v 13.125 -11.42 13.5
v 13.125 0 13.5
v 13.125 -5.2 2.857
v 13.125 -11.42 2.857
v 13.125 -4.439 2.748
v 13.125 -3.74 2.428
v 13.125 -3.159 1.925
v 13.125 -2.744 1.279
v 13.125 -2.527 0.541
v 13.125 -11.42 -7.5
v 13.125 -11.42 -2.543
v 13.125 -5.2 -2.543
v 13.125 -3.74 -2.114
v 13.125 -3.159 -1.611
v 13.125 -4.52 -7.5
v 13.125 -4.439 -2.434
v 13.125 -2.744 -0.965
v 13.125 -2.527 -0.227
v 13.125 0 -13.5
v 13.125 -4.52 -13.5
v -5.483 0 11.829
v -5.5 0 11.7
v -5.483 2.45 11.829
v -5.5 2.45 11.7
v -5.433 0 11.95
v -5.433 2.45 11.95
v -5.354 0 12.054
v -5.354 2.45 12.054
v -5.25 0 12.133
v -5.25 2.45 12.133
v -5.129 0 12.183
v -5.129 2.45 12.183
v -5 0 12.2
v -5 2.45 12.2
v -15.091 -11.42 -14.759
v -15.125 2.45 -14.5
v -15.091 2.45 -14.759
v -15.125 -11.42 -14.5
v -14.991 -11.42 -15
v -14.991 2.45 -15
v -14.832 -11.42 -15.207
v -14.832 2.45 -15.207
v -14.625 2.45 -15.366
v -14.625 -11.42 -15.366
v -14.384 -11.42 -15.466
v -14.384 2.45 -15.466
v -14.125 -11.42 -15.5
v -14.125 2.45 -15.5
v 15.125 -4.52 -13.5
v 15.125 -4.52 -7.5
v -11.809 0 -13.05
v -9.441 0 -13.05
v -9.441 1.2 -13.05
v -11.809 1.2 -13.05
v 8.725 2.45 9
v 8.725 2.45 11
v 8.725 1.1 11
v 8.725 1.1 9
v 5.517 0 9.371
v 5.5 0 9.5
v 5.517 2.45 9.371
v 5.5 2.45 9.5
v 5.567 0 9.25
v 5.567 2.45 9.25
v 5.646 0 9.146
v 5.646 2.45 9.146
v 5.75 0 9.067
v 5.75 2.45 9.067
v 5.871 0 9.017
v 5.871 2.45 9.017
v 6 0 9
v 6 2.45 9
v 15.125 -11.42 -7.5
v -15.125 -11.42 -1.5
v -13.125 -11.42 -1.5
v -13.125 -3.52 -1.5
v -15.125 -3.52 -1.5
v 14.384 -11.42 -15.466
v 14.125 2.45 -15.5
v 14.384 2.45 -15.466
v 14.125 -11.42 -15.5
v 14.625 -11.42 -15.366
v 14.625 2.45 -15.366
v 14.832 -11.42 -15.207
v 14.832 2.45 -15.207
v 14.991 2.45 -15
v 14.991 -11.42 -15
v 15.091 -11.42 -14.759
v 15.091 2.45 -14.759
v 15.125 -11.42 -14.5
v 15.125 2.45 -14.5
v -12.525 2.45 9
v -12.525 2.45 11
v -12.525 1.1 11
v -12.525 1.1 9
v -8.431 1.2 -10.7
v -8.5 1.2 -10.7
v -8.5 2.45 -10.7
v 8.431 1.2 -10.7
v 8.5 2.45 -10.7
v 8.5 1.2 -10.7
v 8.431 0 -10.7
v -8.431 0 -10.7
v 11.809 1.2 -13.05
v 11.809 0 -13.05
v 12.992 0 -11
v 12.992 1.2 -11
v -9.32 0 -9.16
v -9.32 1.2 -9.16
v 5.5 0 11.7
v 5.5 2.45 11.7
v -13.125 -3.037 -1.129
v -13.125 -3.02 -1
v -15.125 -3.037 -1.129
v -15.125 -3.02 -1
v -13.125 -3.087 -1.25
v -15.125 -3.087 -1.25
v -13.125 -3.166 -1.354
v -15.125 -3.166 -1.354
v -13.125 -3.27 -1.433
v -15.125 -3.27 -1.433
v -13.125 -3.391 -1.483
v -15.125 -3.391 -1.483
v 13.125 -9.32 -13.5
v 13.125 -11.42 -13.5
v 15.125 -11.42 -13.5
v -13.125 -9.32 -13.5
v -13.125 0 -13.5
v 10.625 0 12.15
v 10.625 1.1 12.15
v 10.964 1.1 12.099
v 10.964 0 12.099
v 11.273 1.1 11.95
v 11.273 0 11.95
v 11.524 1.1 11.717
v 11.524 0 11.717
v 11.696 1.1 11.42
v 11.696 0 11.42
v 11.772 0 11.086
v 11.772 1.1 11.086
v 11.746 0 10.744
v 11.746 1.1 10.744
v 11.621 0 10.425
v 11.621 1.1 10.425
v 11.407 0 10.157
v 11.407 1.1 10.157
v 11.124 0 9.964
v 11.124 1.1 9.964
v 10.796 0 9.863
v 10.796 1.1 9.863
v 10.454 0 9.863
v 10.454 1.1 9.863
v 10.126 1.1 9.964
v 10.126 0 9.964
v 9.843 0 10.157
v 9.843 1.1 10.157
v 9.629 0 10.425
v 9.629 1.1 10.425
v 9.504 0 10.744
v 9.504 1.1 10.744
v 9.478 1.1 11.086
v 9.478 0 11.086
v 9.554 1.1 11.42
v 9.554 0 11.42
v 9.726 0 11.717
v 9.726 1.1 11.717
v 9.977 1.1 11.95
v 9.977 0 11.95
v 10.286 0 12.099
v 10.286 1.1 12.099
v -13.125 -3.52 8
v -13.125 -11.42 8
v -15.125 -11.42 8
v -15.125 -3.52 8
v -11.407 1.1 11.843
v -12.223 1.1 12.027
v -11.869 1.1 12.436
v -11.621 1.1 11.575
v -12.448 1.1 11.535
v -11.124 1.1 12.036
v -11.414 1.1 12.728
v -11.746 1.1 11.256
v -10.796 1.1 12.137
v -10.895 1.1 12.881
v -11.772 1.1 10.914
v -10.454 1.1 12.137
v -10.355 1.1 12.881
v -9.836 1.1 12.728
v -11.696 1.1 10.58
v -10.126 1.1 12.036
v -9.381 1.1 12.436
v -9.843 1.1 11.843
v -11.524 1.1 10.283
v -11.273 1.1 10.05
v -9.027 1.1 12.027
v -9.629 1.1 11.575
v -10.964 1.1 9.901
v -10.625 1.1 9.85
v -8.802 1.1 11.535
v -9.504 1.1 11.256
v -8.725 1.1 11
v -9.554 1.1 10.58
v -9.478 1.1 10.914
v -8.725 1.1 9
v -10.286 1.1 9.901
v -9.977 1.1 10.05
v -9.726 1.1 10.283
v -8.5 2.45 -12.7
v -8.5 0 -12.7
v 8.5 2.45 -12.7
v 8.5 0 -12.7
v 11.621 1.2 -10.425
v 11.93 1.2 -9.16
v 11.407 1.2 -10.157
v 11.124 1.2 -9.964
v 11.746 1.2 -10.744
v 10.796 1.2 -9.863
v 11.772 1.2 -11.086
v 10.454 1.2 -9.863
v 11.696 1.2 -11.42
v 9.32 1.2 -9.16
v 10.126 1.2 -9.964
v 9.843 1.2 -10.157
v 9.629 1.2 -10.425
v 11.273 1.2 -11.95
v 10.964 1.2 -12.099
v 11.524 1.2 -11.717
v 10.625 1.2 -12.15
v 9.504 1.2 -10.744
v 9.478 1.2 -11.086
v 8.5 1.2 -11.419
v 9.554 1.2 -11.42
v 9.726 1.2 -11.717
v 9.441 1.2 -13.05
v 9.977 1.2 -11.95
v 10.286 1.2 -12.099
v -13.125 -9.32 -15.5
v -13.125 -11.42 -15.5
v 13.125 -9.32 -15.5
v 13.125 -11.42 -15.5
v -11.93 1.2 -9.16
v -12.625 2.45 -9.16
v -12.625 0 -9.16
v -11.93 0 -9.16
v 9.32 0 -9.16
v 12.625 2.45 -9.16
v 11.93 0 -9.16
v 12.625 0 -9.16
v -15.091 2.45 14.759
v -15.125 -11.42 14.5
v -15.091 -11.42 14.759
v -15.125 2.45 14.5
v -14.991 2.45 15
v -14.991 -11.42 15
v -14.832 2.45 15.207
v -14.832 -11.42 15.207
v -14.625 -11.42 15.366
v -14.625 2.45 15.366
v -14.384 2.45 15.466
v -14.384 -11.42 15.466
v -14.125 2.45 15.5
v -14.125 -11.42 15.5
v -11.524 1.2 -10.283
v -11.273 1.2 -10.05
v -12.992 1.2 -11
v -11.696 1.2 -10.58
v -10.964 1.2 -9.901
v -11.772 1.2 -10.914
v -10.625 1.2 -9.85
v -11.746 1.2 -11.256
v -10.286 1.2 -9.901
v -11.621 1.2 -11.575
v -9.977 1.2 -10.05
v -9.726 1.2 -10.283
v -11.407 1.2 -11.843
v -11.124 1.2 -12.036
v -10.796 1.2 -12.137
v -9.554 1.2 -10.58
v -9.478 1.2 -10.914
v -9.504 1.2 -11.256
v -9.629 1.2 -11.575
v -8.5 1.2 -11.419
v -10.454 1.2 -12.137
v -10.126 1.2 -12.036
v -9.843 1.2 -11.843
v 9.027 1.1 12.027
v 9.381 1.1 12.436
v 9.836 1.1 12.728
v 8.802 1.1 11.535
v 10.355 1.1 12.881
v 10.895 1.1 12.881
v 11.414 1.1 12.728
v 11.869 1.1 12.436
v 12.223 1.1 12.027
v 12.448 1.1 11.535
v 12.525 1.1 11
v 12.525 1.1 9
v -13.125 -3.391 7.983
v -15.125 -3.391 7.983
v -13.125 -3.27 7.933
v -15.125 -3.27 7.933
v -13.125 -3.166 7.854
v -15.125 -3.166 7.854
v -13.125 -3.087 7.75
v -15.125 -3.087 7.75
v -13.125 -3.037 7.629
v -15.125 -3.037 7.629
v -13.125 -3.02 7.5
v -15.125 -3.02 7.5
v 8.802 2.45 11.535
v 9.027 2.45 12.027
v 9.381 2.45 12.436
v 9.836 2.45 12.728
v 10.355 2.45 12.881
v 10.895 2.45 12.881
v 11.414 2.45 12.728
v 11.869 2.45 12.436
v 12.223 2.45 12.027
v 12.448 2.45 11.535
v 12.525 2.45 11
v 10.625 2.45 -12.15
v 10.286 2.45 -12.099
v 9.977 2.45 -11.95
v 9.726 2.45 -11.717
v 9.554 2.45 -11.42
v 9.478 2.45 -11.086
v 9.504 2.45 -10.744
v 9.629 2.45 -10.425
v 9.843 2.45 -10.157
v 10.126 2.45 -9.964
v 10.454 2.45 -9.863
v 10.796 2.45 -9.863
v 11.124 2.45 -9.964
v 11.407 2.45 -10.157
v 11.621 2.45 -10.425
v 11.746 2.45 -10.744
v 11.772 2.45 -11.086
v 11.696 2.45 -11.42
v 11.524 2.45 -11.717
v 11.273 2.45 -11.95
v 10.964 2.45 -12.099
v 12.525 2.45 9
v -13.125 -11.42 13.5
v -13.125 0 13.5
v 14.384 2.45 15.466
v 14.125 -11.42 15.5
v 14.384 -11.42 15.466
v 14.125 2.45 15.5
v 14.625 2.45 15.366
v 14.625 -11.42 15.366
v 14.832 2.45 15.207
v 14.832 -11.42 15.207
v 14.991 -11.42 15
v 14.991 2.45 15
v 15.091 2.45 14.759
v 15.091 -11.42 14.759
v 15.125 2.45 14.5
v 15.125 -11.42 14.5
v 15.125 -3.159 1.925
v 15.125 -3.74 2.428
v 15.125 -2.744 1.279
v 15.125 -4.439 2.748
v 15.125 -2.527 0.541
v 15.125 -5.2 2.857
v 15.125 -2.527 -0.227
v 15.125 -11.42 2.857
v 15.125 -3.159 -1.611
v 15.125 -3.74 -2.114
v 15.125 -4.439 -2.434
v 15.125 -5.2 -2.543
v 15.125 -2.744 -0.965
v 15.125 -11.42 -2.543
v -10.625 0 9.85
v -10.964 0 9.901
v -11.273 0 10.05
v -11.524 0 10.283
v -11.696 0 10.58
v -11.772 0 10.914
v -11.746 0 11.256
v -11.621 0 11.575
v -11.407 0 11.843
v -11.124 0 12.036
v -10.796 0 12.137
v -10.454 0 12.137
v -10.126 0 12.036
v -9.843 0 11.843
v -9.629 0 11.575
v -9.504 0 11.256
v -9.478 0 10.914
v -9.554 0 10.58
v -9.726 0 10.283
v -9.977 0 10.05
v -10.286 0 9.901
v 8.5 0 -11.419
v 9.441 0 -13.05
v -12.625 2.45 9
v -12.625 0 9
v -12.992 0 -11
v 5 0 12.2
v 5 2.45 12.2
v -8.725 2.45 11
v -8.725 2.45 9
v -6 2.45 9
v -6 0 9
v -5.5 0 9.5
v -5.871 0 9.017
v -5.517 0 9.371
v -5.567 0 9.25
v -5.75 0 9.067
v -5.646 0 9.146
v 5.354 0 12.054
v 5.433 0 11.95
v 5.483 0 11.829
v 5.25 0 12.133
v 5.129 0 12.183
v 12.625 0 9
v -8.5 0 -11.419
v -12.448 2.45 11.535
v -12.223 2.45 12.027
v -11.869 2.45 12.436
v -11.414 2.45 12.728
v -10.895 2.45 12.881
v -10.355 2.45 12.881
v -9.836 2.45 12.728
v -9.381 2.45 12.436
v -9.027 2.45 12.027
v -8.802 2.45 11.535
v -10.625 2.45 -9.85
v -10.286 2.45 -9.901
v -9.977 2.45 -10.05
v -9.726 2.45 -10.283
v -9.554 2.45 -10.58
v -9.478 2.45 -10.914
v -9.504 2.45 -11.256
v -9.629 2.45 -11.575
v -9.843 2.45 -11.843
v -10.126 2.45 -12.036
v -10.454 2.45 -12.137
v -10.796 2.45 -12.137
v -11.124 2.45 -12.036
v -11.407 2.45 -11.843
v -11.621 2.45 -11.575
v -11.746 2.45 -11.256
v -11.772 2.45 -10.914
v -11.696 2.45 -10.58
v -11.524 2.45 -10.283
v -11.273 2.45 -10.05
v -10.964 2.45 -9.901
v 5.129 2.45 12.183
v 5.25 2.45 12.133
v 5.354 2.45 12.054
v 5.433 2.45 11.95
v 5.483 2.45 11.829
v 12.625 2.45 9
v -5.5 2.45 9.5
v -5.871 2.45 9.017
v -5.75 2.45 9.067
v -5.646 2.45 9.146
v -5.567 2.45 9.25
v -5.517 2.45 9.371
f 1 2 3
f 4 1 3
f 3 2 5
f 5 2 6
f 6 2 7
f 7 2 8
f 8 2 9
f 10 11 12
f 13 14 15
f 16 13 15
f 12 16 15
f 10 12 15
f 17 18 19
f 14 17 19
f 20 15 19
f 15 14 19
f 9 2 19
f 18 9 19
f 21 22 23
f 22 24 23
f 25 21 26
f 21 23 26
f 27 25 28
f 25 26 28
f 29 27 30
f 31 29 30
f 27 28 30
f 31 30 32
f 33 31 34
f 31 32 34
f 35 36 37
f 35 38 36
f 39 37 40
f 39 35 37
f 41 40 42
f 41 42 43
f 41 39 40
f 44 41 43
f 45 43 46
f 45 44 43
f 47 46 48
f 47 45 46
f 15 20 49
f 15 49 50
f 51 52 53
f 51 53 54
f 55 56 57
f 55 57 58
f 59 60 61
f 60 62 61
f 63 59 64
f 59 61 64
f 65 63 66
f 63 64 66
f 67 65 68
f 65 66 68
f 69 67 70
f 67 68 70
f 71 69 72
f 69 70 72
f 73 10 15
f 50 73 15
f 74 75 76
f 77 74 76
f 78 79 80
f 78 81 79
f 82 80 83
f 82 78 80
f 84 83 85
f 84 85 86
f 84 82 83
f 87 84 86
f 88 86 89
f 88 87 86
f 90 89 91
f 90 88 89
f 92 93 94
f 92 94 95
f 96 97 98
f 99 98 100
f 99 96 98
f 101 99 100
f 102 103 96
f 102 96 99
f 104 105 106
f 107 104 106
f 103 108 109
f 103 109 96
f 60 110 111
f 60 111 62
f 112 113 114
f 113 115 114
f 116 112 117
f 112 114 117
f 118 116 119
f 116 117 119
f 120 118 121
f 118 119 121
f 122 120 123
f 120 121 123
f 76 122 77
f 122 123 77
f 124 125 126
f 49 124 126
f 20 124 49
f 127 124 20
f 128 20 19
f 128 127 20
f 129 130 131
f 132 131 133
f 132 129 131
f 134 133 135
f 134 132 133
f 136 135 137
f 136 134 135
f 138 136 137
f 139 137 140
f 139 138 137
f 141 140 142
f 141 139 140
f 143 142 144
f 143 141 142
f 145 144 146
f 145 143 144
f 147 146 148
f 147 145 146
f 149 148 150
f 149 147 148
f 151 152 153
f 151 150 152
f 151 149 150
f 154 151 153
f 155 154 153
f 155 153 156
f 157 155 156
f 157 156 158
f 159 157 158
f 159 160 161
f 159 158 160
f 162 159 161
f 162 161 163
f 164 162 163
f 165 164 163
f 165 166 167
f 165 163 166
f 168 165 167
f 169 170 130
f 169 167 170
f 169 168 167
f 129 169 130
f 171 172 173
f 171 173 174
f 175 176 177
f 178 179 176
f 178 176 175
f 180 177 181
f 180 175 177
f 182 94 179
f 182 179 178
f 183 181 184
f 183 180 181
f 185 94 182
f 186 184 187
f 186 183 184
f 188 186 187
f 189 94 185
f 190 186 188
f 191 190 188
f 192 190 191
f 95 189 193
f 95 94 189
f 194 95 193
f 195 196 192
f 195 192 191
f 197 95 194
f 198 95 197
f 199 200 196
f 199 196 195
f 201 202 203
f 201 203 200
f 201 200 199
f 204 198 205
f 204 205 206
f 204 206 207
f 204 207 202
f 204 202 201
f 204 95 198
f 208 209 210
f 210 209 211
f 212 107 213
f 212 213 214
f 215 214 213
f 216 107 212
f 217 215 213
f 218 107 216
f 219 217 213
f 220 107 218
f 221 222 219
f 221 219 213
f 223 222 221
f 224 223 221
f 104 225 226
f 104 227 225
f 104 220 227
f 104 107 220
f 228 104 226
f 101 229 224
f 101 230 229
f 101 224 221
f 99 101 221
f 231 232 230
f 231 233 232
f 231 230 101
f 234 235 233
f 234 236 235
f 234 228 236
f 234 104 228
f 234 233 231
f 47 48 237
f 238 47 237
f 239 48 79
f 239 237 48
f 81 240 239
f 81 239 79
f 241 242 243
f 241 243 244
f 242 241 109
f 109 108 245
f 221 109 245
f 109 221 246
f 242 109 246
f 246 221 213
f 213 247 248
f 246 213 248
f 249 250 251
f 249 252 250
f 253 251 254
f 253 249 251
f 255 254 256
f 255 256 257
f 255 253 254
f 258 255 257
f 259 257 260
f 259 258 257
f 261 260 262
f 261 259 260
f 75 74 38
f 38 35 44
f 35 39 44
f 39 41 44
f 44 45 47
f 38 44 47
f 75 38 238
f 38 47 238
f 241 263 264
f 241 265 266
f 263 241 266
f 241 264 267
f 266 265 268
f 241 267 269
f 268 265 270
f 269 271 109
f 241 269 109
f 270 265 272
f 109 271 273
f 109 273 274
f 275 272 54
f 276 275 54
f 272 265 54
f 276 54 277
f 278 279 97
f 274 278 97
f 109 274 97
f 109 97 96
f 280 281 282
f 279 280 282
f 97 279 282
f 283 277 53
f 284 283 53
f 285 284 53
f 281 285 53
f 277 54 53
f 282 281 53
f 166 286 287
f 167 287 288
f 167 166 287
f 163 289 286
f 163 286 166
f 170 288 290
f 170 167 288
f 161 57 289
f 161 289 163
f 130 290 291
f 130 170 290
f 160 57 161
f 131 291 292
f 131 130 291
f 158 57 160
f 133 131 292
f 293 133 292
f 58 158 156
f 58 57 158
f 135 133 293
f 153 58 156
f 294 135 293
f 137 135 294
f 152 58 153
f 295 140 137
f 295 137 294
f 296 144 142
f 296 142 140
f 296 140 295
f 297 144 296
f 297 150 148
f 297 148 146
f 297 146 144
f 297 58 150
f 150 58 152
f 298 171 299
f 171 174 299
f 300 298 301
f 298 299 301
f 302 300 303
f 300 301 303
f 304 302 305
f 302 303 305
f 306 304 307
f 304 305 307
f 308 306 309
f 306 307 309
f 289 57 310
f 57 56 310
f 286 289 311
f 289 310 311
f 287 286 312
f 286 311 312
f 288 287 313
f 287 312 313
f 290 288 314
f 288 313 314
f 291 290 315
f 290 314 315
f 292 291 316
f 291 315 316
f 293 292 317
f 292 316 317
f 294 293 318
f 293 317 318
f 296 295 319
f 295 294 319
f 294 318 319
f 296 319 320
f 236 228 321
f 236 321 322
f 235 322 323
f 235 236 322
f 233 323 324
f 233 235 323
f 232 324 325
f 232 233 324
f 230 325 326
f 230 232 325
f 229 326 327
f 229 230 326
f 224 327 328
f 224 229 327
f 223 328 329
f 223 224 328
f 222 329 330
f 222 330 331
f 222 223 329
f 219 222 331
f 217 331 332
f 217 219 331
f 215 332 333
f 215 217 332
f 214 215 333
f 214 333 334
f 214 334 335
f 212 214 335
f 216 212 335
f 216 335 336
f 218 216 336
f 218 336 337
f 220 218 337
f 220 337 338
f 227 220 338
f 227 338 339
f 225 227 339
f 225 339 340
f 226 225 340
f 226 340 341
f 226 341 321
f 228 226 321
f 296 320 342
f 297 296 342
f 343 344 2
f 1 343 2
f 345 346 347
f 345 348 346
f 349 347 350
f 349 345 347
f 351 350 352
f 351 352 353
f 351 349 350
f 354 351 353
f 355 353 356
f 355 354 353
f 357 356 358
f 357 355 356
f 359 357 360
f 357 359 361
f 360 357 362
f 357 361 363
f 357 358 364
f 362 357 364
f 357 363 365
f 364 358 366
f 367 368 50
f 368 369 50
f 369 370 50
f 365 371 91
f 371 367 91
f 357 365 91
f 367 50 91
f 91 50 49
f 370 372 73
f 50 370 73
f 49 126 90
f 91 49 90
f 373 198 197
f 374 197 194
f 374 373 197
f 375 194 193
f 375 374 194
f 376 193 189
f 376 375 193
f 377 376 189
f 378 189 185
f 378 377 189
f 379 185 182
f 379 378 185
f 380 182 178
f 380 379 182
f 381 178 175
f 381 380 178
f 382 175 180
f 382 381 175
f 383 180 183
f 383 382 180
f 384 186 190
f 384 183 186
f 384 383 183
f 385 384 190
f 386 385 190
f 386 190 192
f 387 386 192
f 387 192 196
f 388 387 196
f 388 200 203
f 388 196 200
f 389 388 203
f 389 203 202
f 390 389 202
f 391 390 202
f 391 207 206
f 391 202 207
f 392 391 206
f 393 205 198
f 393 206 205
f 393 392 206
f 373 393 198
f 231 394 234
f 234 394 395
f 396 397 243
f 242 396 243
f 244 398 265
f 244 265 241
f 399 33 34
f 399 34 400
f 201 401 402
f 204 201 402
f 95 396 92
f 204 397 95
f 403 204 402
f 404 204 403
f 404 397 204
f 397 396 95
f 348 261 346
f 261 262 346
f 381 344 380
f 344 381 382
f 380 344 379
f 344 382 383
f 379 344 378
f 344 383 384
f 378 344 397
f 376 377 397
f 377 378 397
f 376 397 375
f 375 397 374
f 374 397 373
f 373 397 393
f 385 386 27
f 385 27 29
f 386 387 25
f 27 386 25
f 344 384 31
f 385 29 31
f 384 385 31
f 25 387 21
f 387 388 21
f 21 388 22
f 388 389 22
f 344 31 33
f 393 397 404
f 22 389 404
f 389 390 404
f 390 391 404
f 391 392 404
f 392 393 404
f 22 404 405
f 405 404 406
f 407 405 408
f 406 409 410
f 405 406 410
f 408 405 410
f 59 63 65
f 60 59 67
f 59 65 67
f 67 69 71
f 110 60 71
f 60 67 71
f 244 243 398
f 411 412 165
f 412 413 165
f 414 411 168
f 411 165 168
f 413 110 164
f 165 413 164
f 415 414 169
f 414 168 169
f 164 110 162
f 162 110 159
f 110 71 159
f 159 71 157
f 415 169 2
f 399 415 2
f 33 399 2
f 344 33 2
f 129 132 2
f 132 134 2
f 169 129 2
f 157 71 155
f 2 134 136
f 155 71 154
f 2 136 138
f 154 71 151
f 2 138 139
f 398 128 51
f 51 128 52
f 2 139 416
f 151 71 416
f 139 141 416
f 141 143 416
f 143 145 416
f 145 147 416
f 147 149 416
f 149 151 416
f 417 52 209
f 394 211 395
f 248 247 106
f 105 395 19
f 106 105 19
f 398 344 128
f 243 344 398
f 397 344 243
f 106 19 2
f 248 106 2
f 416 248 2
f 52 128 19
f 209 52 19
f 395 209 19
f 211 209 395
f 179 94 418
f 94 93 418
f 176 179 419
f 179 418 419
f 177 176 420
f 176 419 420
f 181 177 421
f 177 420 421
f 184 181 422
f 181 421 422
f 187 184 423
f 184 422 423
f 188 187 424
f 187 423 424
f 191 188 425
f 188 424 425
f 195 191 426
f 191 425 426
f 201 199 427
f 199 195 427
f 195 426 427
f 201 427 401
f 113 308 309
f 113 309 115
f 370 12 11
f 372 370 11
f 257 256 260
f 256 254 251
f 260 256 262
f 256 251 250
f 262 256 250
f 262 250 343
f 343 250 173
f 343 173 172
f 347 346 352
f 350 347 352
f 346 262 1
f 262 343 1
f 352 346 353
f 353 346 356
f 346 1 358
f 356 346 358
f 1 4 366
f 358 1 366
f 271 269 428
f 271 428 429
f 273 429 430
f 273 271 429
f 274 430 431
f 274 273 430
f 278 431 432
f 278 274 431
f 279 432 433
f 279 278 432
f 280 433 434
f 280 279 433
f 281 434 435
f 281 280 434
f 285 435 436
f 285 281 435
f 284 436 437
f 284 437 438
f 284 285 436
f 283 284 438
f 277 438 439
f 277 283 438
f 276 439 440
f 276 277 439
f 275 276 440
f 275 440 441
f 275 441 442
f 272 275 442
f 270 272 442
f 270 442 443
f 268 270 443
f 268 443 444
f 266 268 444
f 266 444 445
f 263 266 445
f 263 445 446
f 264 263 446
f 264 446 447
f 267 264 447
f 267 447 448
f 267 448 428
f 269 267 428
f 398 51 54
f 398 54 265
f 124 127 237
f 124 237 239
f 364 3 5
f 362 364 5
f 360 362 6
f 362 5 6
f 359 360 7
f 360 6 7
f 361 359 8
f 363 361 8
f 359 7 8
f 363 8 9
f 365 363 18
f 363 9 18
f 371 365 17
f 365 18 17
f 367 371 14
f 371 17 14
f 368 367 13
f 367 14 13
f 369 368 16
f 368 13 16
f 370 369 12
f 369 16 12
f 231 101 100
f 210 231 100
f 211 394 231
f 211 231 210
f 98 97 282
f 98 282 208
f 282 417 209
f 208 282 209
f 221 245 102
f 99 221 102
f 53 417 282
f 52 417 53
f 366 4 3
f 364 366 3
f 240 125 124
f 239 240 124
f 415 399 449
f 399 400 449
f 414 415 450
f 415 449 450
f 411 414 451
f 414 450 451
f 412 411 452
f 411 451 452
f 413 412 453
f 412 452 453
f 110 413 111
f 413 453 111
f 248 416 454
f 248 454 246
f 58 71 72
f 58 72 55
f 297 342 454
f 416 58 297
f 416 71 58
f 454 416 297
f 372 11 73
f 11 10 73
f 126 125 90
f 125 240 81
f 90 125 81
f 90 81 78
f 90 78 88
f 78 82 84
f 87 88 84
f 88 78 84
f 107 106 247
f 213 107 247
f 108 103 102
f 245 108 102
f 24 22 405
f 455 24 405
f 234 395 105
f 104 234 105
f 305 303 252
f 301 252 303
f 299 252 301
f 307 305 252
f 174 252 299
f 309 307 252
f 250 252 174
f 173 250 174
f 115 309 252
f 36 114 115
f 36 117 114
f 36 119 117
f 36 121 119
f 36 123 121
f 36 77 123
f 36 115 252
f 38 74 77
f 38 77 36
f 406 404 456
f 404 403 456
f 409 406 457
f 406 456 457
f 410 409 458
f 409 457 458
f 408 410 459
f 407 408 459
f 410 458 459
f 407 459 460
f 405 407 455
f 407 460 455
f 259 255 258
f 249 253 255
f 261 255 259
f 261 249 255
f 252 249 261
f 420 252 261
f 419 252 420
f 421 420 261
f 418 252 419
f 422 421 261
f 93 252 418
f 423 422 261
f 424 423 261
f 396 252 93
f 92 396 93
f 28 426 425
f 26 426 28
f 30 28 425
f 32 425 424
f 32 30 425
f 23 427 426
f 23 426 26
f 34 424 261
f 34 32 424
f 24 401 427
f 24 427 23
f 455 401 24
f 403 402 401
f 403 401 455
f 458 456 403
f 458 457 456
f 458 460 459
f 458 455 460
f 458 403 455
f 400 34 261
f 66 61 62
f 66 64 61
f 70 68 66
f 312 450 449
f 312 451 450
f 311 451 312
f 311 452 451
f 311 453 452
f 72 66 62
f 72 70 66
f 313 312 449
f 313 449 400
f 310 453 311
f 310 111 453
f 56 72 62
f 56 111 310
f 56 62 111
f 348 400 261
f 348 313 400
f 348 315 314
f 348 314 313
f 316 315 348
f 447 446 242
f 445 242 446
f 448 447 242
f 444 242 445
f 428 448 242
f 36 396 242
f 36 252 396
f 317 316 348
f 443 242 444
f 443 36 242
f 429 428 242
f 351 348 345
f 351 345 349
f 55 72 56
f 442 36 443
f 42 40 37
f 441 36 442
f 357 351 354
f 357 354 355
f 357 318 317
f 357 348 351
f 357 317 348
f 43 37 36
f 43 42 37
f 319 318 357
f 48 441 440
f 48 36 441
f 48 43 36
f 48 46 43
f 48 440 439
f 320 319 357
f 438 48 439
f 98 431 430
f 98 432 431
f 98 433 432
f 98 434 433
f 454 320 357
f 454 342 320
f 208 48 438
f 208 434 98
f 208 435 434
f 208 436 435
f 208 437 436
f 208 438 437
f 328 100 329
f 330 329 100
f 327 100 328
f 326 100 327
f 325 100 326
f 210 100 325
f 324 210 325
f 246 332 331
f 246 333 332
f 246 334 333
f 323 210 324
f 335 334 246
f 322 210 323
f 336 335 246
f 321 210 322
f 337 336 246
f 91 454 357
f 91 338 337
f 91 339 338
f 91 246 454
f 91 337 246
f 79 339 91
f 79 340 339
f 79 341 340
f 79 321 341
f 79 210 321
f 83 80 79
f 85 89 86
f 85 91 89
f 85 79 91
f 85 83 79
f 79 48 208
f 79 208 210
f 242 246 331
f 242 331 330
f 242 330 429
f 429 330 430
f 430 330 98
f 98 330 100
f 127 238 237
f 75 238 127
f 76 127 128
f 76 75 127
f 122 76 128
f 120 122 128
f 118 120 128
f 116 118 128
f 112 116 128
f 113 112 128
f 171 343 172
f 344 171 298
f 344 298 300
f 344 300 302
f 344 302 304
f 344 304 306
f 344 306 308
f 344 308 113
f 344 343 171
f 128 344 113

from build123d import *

# Parameters (mm, degrees)
SKETCH_1_W           = 30.25
SKETCH_1_H           = 31
SKETCH_1_W_2         = 26.25
SKETCH_1_H_2         = 27
EXTRUDE_1_DEPTH      = 11.42
SKETCH_2_W           = 30.25
SKETCH_2_H           = 31
EXTRUDE_2_DEPTH      = 2.45
SKETCH_3_W           = 25.25
SKETCH_3_H           = 18.16
CUT_EXTRUDE_1_DEPTH  = 2.45
SKETCH_4_R           = 1.15
CUT_EXTRUDE_3_DEPTH  = 2.45
CUT_EXTRUDE_4_DEPTH  = 1.2
SKETCH_6_R           = 1.9
CUT_EXTRUDE_5_DEPTH  = 1.35
SKETCH_7_W           = 11
SKETCH_7_H           = 3.2
CUT_EXTRUDE_7_DEPTH  = 2.45
SKETCH_8_W           = 17
SKETCH_8_H           = 2
CUT_EXTRUDE_9_DEPTH  = 2.45
FILLET_1_R           = 1
SKETCH_12_W          = 6
SKETCH_12_H          = 6.9
CUT_EXTRUDE_10_DEPTH = 2
CUT_EXTRUDE_11_DEPTH = 2
SKETCH_15_W          = 9.5
SKETCH_15_H          = 8.4
CUT_EXTRUDE_12_DEPTH = 2
FILLET_2_R           = 0.5
FILLET_3_R           = 0.5
CUT_EXTRUDE_19_REACH = 36.644
SKETCH_17_W          = 26.25
SKETCH_17_H          = 2.1
SKETCH_18_W          = 3.8
SKETCH_18_H          = 2
CUT_EXTRUDE_20_DEPTH = 1.35


with BuildPart() as part:
    # 草图1 → 凸台-拉伸1 (new body)
    with BuildSketch(Plane(origin=(0, 0, 0), x_dir=(1, 0, 0), z_dir=(0, 1, 0))):
        Rectangle(SKETCH_1_W, SKETCH_1_H)
        Rectangle(SKETCH_1_W_2, SKETCH_1_H_2, mode=Mode.SUBTRACT)
    extrude(amount=-EXTRUDE_1_DEPTH)

    # 草图2 → 凸台-拉伸2 (add)
    with BuildSketch(Plane(origin=(0, 0, 0), x_dir=(1, 0, 0), z_dir=(0, 1, 0))):
        Rectangle(SKETCH_2_W, SKETCH_2_H)
    extrude(amount=EXTRUDE_2_DEPTH)

    # 草图3 → 切除-拉伸1 (cut)
    with BuildSketch(Plane(origin=(0, 0, 0), x_dir=(1, 0, 0), z_dir=(0, 1, 0))):
        with Locations((0, 0.08)):
            Rectangle(SKETCH_3_W, SKETCH_3_H)
    extrude(amount=CUT_EXTRUDE_1_DEPTH, mode=Mode.SUBTRACT)

    # 草图4 → 切除-拉伸3 (cut)
    with BuildSketch(Plane(origin=(0, 0, 0), x_dir=(1, 0, 0), z_dir=(0, 1, 0))):
        with Locations(Location((-10.625, 11, 0), (0, 0, 270))):
            Circle(SKETCH_4_R)
        with Locations(Location((-10.625, -11, 0), (0, 0, 90))):
            Circle(SKETCH_4_R)
        with Locations(Location((10.625, 11, 0), (0, 0, 90))):
            Circle(SKETCH_4_R)
        with Locations(Location((10.625, -11, 0), (0, 0, 270))):
            Circle(SKETCH_4_R)
    extrude(amount=CUT_EXTRUDE_3_DEPTH, mode=Mode.SUBTRACT)

    # 草图5 → 切除-拉伸4 (cut)
    with BuildSketch(Plane(origin=(0, 0, 0), x_dir=(1, 0, 0), z_dir=(0, 1, 0))):
        Polygon((-9.441431948, 8.95), (-8.257863896, 11), (-9.441431948, 13.05), (-11.808568052, 13.05), (-12.992136104, 11), (-11.808568052, 8.95), align=None)
        Polygon((11.808568052, 8.95), (9.441431948, 8.95), (8.257863896, 11), (9.441431948, 13.05), (11.808568052, 13.05), (12.992136104, 11), align=None)
    extrude(amount=CUT_EXTRUDE_4_DEPTH, mode=Mode.SUBTRACT)

    # 草图6 → 切除-拉伸5 (cut)
    with BuildSketch(Plane(origin=(0, 2.45, 0), x_dir=(1, 0, 0), z_dir=(0, 1, 0))):
        with Locations(Location((-10.625, -11, 0), (0, 0, 270))):
            Circle(SKETCH_6_R)
        with Locations(Location((10.625, -11, 0), (0, 0, 270))):
            Circle(SKETCH_6_R)
    extrude(amount=-CUT_EXTRUDE_5_DEPTH, mode=Mode.SUBTRACT)

    # 草图7 → 切除-拉伸7 (cut)
    with BuildSketch(Plane(origin=(0, 0, 0), x_dir=(1, 0, 0), z_dir=(0, 1, 0))):
        with Locations((0, -10.6)):
            Rectangle(SKETCH_7_W, SKETCH_7_H)
    extrude(amount=CUT_EXTRUDE_7_DEPTH, mode=Mode.SUBTRACT)

    # 草图8 → 切除-拉伸9 (cut)
    with BuildSketch(Plane(origin=(0, 0, 0), x_dir=(1, 0, 0), z_dir=(0, 1, 0))):
        with Locations((0, 11.7)):
            Rectangle(SKETCH_8_W, SKETCH_8_H)
    extrude(amount=CUT_EXTRUDE_9_DEPTH, mode=Mode.SUBTRACT)

    # 圆角1
    fillet_1_edges = [part.edges().sort_by_distance(p)[0] for p in [
        (-15.125, -4.485, -15.5),
        (15.125, -4.485, -15.5),
        (15.125, -4.485, 15.5),
        (-15.125, -4.485, 15.5),
    ]]
    fillet(fillet_1_edges, radius=FILLET_1_R)

    # 草图12 → 切除-拉伸10 (cut)
    with BuildSketch(Plane.ZY.offset(-13.125)):
        with Locations((-10.5, -7.97)):
            Rectangle(SKETCH_12_W, SKETCH_12_H)
    extrude(amount=-CUT_EXTRUDE_10_DEPTH, mode=Mode.SUBTRACT)

    # 草图14 → 切除-拉伸11 (cut)
    with BuildSketch(Plane.ZY.offset(-13.125)):
        with BuildLine():
            Line((2.857, -11.42), (2.857, -5.2))
            ThreePointArc((2.857, -5.2), (0.157, -2.5), (-2.543, -5.2))
            Line((-2.543, -5.2), (-2.543, -11.42))
            Line((-2.543, -11.42), (2.857, -11.42))
        make_face()
    extrude(amount=-CUT_EXTRUDE_11_DEPTH, mode=Mode.SUBTRACT)

    # 草图15 → 切除-拉伸12 (cut)
    with BuildSketch(Plane(origin=(-13.125, 0, 0), x_dir=(0, 0, -1), z_dir=(1, 0, 0))):
        with Locations((-3.25, -7.22)):
            Rectangle(SKETCH_15_W, SKETCH_15_H)
    extrude(amount=-CUT_EXTRUDE_12_DEPTH, mode=Mode.SUBTRACT)

    # 圆角2
    fillet_2_edges = [part.edges().sort_by_distance(p)[0] for p in [
        (-14.125, -3.02, 8),
        (-14.125, -3.02, -1.5),
    ]]
    fillet(fillet_2_edges, radius=FILLET_2_R)

    # 圆角3
    fillet_3_edges = [part.edges().sort_by_distance(p)[0] for p in [
        (-5.5, 1.225, 12.2),
        (5.5, 1.225, 12.2),
        (5.5, 1.225, 9),
        (-5.5, 1.225, 9),
    ]]
    fillet(fillet_3_edges, radius=FILLET_3_R)

    # 草图17 → 切除-拉伸19 (cut, up to next)
    with BuildSketch(Plane.XY.offset(-13.5), mode=Mode.PRIVATE) as cut_extrude_19_sk1:
        with Locations((0, -10.37)):
            Rectangle(SKETCH_17_W, SKETCH_17_H)
    cut_extrude_19_tool1 = extrude(cut_extrude_19_sk1.sketch, amount=-CUT_EXTRUDE_19_REACH, mode=Mode.PRIVATE) & part.part
    add(cut_extrude_19_tool1.solids().sort_by_distance((0, -10.37, -13.5))[0], mode=Mode.SUBTRACT)

    # 草图18 → 切除-拉伸20 (cut)
    with BuildSketch(Plane(origin=(0, 2.45, 0), x_dir=(1, 0, 0), z_dir=(0, 1, 0))):
        with Locations((-10.625, -10)):
            Rectangle(SKETCH_18_W, SKETCH_18_H)
        with Locations((10.625, -10)):
            Rectangle(SKETCH_18_W, SKETCH_18_H)
    extrude(amount=-CUT_EXTRUDE_20_DEPTH, mode=Mode.SUBTRACT)


solid = part.part
